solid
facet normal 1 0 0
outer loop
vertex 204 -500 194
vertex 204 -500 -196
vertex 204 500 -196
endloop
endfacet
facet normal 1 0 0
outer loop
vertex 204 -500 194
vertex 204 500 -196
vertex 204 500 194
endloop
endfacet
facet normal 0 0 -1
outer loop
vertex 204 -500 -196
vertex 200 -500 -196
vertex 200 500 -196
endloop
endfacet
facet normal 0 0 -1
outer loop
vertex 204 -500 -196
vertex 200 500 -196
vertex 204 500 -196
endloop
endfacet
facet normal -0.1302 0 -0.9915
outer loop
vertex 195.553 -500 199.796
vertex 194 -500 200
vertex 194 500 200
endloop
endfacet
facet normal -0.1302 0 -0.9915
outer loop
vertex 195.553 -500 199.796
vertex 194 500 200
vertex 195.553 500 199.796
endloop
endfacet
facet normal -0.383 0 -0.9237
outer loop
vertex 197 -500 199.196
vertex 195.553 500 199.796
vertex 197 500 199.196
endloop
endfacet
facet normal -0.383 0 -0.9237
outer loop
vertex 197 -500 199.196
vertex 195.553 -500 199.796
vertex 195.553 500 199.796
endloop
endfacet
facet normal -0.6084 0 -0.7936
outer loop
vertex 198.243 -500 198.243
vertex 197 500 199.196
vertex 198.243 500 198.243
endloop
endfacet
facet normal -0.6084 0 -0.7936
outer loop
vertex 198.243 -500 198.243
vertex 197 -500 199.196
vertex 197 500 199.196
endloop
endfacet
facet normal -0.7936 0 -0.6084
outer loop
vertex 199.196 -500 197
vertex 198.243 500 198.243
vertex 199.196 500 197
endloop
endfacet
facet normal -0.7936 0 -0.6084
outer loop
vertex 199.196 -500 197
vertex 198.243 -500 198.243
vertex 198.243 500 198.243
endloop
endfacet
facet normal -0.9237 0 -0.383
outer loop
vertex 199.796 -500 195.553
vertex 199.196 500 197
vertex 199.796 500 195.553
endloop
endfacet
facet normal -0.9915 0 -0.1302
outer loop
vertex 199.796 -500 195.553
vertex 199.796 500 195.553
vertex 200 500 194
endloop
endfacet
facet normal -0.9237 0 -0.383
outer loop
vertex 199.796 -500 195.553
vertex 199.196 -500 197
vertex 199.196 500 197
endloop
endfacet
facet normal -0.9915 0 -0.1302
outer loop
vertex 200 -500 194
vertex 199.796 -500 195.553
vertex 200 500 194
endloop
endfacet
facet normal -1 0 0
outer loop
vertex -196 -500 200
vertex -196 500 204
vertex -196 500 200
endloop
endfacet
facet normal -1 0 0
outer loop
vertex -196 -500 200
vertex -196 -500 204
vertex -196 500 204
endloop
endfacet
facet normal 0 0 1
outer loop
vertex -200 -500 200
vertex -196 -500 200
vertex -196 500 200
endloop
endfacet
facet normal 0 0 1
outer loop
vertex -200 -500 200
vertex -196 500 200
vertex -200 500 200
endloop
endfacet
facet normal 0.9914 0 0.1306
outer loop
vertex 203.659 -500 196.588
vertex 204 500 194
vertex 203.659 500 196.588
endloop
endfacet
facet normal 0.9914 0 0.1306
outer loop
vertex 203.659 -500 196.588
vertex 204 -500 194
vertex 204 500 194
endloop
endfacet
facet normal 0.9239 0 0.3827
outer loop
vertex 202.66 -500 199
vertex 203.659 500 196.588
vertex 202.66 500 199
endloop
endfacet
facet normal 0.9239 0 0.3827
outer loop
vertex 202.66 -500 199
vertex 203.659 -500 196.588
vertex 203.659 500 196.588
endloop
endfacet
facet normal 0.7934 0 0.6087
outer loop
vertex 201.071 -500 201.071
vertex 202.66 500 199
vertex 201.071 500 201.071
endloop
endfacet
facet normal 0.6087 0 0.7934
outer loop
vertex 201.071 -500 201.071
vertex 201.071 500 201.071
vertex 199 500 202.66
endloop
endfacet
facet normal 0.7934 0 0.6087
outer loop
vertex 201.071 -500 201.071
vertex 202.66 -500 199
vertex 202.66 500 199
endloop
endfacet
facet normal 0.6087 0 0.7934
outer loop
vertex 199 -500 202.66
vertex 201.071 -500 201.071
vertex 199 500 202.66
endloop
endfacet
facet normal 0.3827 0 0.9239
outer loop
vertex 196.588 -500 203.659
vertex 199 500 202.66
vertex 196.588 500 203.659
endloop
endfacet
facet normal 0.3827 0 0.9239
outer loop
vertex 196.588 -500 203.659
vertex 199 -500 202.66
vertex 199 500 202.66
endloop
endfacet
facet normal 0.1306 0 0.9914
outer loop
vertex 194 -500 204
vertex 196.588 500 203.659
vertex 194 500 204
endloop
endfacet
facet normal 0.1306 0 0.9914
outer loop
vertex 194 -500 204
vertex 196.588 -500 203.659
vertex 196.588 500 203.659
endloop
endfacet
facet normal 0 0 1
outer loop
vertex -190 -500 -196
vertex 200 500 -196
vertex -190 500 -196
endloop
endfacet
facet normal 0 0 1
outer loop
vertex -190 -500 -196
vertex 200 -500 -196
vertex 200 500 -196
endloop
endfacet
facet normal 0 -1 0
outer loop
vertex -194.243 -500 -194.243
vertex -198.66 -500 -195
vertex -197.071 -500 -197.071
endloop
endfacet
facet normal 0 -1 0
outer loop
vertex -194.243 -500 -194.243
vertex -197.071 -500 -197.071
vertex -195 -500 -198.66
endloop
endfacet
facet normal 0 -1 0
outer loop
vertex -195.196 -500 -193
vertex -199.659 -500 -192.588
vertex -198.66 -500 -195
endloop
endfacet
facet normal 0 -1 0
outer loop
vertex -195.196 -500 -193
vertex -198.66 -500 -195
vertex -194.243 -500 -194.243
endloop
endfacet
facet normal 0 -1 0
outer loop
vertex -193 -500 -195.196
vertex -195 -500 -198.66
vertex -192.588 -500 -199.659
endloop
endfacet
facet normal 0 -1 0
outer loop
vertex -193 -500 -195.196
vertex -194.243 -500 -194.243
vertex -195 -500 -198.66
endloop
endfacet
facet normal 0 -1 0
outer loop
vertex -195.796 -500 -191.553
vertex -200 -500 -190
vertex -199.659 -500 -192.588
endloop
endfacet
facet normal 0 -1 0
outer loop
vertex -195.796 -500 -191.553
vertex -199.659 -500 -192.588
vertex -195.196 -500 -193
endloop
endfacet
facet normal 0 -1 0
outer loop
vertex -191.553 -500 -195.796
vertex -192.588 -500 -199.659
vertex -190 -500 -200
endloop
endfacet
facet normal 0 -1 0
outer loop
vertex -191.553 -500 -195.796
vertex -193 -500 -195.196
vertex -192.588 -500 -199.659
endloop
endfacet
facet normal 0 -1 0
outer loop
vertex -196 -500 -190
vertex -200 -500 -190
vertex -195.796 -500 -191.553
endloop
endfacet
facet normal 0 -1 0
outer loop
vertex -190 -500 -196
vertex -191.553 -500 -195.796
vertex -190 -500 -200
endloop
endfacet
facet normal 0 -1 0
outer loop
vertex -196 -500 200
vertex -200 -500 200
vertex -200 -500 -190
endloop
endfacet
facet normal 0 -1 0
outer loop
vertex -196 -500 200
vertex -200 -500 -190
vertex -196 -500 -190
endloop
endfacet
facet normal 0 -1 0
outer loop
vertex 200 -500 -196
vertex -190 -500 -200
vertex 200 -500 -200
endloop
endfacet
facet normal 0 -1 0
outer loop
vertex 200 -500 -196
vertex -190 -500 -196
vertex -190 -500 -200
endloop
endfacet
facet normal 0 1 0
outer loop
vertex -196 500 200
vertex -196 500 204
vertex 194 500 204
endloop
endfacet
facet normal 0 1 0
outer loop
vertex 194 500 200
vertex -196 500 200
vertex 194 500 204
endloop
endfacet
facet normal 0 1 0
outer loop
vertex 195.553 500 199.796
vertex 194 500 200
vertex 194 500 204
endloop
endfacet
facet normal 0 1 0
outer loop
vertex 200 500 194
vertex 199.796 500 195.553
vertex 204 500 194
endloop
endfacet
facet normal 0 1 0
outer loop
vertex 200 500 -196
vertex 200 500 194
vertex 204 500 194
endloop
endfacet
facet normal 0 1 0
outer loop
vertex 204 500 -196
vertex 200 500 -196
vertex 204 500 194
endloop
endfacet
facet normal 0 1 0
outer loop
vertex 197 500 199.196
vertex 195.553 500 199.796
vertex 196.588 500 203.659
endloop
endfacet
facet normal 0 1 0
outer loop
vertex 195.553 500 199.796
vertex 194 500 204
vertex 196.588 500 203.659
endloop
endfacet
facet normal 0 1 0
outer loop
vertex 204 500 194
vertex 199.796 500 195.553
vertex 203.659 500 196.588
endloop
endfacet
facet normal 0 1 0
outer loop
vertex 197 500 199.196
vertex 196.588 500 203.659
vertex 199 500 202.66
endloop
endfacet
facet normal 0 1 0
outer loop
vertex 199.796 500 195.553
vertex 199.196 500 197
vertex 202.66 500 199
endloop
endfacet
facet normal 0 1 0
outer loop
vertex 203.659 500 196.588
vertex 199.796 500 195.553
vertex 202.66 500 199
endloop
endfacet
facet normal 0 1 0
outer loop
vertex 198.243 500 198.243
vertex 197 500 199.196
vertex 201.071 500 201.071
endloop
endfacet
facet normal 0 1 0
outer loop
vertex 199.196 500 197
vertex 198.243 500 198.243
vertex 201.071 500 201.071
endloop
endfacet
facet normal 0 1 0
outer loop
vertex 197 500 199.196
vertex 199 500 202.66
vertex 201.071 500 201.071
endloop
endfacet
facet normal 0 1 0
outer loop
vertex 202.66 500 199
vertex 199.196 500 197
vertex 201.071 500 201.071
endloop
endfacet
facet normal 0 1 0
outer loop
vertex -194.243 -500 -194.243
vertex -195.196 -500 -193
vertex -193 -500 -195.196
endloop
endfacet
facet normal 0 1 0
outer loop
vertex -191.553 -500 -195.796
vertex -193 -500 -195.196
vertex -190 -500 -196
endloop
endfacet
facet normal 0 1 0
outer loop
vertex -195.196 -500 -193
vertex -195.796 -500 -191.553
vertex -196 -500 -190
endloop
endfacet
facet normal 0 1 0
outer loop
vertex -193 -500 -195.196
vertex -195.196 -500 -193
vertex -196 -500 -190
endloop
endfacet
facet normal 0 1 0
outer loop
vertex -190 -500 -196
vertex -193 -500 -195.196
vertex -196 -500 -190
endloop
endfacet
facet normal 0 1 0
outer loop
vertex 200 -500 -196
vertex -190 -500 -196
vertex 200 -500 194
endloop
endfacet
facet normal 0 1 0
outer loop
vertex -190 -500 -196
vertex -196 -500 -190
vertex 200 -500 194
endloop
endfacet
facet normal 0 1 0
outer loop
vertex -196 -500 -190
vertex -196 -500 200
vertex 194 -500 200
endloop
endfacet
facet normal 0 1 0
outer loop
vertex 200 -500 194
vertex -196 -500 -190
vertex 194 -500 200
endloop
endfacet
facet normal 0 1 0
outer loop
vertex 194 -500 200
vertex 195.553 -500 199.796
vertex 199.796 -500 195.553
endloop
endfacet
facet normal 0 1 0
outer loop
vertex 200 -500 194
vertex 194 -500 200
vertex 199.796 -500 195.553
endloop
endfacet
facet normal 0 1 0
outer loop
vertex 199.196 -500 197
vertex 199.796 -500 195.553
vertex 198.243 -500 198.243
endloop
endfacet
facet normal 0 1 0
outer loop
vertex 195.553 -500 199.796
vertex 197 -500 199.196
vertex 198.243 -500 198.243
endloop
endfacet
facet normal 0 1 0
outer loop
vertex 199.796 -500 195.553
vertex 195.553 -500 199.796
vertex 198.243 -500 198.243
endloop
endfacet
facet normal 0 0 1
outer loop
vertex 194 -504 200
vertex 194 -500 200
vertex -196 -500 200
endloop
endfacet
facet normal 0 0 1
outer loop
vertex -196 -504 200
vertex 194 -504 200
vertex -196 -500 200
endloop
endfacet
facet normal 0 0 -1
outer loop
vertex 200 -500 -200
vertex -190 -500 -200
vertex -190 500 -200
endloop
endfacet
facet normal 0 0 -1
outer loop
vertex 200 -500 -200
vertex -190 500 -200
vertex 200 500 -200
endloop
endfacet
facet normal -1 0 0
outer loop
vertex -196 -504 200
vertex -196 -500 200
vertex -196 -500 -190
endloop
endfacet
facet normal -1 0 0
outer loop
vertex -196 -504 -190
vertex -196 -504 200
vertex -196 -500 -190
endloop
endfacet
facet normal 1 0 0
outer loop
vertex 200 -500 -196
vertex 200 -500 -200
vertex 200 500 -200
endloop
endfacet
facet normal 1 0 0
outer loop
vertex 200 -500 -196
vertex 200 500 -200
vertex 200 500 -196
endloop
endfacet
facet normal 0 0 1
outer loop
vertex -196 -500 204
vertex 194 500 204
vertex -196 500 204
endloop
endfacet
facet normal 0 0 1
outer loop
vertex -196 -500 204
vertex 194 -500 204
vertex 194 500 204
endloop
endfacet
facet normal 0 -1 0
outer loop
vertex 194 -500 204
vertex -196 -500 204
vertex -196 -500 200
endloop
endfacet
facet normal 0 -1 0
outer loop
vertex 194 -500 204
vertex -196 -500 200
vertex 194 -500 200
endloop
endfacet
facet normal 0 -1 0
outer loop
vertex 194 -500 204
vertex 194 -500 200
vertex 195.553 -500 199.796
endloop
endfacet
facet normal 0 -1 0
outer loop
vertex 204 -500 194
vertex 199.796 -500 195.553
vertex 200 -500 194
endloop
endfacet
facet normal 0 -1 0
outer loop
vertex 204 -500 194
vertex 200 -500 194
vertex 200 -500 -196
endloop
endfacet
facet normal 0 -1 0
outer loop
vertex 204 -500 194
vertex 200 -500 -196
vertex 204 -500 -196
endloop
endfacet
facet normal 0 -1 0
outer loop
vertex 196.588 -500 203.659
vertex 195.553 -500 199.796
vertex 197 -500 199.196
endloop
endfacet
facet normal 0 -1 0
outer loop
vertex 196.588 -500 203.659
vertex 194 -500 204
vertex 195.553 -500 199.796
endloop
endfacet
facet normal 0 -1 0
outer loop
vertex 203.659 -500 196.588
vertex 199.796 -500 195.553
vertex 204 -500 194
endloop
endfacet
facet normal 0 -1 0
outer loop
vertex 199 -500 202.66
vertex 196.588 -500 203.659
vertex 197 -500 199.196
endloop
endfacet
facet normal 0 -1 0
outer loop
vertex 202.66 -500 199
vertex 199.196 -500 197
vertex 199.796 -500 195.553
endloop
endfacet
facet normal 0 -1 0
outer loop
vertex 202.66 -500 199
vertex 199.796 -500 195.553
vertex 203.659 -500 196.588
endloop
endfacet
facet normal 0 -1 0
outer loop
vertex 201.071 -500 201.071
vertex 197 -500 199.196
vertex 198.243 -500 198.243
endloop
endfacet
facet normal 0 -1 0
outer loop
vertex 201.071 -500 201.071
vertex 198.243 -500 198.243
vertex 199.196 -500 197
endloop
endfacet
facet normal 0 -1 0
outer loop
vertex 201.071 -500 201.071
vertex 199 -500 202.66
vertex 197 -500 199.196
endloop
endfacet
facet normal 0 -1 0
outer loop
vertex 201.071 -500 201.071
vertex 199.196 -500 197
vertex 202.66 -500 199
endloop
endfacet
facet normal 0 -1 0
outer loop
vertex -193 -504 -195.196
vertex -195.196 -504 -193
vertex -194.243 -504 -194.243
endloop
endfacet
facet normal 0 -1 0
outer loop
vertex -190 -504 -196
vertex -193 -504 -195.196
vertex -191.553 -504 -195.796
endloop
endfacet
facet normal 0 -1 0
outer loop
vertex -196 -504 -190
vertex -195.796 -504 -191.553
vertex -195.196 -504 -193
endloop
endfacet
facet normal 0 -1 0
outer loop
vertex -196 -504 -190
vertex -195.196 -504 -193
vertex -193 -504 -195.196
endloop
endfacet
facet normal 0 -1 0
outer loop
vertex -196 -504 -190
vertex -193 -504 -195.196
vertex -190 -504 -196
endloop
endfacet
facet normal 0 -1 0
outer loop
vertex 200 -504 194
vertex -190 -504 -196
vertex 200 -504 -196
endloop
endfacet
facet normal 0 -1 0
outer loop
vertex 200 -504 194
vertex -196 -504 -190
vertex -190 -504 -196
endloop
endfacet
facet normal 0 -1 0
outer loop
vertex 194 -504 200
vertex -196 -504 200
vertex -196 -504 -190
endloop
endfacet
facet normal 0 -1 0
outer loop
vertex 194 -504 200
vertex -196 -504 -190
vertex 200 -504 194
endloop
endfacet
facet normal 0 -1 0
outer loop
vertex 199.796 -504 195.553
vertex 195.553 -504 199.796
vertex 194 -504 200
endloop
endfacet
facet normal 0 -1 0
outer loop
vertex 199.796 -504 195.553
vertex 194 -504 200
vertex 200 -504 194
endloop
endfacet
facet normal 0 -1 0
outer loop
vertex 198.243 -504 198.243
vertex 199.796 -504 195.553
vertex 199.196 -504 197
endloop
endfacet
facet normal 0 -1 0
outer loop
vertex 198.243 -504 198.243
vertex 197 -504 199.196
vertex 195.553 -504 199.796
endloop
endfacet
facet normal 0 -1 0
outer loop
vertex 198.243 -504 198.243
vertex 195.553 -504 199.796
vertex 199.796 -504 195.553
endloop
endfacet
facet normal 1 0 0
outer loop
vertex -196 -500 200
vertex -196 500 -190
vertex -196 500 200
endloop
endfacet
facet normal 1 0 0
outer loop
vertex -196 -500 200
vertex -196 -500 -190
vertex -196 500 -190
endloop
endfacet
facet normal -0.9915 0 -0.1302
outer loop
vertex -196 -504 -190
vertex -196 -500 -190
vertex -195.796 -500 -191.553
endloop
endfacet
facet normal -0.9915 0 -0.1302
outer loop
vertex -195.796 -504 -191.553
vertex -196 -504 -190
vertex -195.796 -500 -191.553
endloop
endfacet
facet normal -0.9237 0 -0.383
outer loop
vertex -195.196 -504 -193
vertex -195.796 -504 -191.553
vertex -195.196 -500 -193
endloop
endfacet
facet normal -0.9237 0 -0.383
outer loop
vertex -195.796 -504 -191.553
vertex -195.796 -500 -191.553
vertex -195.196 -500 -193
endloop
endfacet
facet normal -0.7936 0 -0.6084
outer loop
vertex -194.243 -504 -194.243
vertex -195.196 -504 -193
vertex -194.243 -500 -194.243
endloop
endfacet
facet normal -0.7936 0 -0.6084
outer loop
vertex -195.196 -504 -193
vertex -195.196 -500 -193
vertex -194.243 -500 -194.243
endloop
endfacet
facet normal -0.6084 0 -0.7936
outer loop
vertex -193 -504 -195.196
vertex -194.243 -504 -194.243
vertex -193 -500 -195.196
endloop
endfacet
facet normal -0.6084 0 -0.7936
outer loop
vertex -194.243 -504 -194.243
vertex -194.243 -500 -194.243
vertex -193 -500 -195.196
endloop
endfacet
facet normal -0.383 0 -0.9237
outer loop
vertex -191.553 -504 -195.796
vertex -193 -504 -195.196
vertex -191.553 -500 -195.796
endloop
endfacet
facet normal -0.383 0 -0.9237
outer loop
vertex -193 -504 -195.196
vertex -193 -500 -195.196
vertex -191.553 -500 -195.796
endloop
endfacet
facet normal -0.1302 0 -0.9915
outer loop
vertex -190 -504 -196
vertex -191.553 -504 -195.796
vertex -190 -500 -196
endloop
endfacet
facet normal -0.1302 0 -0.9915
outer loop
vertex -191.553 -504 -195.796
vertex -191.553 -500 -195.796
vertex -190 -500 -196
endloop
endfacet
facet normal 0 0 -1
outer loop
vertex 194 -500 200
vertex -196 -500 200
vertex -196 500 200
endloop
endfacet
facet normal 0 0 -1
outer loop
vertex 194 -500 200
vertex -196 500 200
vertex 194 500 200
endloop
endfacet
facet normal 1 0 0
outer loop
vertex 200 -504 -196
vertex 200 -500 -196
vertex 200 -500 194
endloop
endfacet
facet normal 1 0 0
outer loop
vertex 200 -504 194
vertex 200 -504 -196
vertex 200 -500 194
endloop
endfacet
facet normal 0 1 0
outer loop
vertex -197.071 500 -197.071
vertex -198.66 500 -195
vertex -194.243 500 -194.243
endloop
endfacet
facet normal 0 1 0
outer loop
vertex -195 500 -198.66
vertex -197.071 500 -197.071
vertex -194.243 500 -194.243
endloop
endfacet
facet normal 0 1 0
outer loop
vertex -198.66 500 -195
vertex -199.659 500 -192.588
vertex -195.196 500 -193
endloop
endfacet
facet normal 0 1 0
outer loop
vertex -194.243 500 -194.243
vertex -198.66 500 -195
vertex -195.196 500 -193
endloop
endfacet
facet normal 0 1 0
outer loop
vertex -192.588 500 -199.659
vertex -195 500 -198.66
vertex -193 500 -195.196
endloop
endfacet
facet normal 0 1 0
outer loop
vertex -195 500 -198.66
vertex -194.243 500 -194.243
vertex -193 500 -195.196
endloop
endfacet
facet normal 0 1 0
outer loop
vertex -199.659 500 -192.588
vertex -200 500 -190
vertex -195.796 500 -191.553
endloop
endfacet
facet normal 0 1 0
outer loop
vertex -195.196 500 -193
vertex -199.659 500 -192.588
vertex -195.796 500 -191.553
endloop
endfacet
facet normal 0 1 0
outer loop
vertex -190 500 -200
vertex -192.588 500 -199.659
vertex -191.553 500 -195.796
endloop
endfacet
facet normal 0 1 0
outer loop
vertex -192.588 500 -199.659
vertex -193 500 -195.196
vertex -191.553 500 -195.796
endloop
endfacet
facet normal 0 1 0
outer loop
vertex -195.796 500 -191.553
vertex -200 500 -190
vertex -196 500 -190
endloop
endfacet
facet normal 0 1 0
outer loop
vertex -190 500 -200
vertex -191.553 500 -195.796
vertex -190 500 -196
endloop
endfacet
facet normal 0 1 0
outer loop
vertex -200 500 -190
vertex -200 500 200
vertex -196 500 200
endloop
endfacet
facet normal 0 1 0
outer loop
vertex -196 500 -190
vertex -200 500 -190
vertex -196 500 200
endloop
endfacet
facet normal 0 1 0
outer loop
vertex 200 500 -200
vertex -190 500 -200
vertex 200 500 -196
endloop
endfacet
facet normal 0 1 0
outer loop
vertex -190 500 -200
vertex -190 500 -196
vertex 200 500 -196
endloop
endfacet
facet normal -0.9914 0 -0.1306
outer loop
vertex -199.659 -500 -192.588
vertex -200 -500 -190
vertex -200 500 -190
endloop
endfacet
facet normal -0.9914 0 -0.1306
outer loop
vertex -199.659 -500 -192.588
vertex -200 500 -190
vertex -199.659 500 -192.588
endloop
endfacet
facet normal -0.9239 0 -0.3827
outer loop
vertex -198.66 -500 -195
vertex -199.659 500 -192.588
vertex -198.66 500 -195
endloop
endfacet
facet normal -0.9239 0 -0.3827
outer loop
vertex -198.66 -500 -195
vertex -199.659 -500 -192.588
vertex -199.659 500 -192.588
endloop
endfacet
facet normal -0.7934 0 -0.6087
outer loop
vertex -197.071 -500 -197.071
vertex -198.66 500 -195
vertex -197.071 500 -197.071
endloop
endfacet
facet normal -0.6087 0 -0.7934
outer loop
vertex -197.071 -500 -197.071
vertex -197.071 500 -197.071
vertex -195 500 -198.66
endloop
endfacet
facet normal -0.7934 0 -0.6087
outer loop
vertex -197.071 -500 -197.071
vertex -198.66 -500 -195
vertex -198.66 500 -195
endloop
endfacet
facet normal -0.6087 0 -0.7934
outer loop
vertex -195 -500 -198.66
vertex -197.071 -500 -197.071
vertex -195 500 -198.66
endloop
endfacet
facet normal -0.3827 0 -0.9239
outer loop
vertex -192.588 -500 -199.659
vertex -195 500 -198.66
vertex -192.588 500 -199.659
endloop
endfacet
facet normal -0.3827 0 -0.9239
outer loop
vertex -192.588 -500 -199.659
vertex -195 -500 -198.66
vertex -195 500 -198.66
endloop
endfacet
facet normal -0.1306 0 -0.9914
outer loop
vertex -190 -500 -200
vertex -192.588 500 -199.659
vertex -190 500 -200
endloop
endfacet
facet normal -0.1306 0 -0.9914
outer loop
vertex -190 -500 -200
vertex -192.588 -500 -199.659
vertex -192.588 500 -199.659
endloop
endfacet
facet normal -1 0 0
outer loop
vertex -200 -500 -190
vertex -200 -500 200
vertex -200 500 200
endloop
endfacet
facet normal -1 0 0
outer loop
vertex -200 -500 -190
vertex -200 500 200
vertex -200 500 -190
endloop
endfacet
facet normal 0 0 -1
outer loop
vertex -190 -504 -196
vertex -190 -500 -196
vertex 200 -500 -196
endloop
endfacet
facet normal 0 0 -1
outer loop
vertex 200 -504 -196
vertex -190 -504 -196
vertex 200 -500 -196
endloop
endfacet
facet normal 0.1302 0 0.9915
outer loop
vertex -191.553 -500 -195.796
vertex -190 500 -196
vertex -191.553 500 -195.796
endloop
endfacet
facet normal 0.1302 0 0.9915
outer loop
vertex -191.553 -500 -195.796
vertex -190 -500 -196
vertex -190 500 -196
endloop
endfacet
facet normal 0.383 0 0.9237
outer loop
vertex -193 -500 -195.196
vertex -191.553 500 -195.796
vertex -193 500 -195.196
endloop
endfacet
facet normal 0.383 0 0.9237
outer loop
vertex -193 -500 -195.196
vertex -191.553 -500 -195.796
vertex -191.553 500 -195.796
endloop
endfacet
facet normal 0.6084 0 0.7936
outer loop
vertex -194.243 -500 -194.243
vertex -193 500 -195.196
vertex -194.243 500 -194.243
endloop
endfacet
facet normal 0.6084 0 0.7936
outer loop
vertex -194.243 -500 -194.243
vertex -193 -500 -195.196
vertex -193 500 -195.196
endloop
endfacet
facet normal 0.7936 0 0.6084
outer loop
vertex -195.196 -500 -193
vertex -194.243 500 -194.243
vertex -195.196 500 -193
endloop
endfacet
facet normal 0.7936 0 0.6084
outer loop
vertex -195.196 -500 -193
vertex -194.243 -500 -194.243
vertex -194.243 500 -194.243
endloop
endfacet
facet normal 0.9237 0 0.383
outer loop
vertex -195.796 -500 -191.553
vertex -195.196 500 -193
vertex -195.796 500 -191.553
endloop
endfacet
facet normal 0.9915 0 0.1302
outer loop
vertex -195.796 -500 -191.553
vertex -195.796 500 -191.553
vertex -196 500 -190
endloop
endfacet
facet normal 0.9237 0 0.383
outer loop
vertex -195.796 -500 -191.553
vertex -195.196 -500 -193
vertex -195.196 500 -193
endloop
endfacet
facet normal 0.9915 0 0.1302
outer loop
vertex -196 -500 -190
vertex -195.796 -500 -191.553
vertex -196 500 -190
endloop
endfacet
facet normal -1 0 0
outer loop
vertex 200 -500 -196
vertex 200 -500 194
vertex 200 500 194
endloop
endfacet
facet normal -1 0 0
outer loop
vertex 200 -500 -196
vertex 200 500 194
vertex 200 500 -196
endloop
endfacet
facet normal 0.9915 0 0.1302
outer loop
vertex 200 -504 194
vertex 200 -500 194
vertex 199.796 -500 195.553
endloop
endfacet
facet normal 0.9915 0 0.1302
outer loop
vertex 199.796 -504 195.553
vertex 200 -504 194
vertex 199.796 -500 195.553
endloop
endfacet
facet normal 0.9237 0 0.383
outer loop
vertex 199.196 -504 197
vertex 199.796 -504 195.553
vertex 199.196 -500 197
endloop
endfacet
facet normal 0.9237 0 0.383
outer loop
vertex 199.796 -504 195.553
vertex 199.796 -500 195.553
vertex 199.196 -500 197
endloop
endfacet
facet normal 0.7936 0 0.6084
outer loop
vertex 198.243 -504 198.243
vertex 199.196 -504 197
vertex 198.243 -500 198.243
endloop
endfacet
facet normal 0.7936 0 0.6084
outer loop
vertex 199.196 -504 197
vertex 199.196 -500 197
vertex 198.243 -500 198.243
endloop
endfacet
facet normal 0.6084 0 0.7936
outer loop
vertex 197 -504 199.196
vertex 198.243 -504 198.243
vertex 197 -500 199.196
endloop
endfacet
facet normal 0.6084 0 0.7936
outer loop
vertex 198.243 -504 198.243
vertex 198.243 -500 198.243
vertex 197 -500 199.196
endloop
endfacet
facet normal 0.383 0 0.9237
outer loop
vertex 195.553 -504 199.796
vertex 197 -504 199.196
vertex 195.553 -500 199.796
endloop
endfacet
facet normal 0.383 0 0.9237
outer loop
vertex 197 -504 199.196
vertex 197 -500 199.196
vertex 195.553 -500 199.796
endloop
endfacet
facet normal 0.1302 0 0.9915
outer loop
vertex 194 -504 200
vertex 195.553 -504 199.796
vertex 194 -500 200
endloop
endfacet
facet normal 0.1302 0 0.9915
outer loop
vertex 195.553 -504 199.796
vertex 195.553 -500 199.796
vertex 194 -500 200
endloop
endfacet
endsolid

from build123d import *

# Parameters (mm, degrees)
F1_DEPTH = 500
F2_DEPTH = 500
F3_START = 500
F3_DEPTH = 4


with BuildPart() as f1:
    # F0 (on Front) → F1 (new body, symmetric)
    with BuildSketch(Plane.XZ):
        with BuildLine():
            Line((-196, 204), (-196, 200))
            Line((-196, 200), (194, 200))
            ThreePointArc((194, 200), (198.2426406871, 198.2426406871), (200, 194))
            Line((200, 194), (200, -196))
            Line((200, -196), (204, -196))
            Line((204, -196), (204, 194))
            ThreePointArc((204, 194), (201.0710678119, 201.0710678119), (194, 204))
            Line((194, 204), (-196, 204))
        make_face()
    extrude(amount=F1_DEPTH, both=True)


with BuildPart() as f2:
    # F0 (on Front) → F2 (new body, symmetric)
    with BuildSketch(Plane.XZ):
        with BuildLine():
            Line((-196, -190), (-196, 200))
            Line((-196, 200), (-200, 200))
            Line((-200, 200), (-200, -190))
            ThreePointArc((-200, -190), (-197.0710678119, -197.0710678119), (-190, -200))
            Line((-190, -200), (200, -200))
            Line((200, -200), (200, -196))
            Line((200, -196), (-190, -196))
            ThreePointArc((-190, -196), (-194.2426406871, -194.2426406871), (-196, -190))
        make_face()
    extrude(amount=F2_DEPTH, both=True)


with BuildPart() as f3:
    # F0 (on Front) → F3 (new body)
    with BuildSketch(Plane.XZ.offset(F3_START)):
        with BuildLine():
            Line((194, 200), (-196, 200))
            Line((-196, 200), (-196, -190))
            ThreePointArc((-196, -190), (-194.2426406871, -194.2426406871), (-190, -196))
            Line((-190, -196), (200, -196))
            Line((200, -196), (200, 194))
            ThreePointArc((200, 194), (198.2426406871, 198.2426406871), (194, 200))
        make_face()
    extrude(amount=F3_DEPTH)


solid = Compound([f1.part, f2.part, f3.part])
